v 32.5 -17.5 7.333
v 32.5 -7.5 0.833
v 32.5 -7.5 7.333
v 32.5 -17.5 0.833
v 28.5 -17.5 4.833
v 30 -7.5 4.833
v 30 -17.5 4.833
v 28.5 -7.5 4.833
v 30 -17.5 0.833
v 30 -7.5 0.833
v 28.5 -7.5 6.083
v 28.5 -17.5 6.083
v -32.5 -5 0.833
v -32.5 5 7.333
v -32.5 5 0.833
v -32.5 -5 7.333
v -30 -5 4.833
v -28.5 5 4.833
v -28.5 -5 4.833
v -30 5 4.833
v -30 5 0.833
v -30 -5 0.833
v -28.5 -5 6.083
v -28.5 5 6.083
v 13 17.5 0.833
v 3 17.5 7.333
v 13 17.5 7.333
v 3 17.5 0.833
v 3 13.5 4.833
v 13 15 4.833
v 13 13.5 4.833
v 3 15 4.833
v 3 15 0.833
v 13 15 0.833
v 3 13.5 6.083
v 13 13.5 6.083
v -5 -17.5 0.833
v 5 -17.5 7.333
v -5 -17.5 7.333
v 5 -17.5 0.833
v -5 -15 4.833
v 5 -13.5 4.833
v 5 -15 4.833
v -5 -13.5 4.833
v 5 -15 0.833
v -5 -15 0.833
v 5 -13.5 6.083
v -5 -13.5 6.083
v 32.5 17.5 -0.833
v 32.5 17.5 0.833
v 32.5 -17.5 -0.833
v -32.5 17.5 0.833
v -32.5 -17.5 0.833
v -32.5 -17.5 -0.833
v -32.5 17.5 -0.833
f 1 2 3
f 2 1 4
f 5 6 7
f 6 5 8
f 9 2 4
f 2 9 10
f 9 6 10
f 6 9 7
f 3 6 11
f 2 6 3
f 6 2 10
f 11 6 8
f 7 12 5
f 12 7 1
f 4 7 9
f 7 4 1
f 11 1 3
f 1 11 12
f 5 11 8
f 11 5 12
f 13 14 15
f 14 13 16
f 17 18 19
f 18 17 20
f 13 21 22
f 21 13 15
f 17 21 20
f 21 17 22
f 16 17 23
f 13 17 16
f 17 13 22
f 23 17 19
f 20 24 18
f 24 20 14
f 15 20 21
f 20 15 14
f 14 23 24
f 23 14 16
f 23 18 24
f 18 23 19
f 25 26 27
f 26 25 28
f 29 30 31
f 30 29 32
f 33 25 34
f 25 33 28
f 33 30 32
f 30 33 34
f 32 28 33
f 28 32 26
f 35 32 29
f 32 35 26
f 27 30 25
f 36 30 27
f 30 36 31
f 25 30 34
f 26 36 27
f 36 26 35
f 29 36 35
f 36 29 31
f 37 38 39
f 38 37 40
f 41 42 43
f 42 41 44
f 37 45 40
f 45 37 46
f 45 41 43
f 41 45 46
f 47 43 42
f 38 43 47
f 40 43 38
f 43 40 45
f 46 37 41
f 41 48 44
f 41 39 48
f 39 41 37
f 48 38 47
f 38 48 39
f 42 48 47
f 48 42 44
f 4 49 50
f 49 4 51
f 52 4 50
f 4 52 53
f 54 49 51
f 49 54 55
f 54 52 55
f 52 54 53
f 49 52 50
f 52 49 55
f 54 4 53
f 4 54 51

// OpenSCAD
$fn = 100;

// element dimensions
w = 60;
d = 30;
h = 4;

// aditionnal parameters
e = 5;

// internal values
we = w + e;
de = d + e;

translate([0,0,e/2]);
cube([we,de,e/3], true);
module tab() {
    translate([-e/4,0,(e/3+h)/2]) {
        cube([e/2,2*e,h], true);
        translate([-1.75*e,-e,h/2])
        rotate([0,-90,-90])
        linear_extrude(height = 2*e)
        polygon([[0,1.2*e],[e/4,1.2*e],[0,2*e],[e/2,2*e]],
                [[0,1,3,2]]);
    }
}

translate([we/2,-de/2+e,0])
tab();

translate([-we/2,0,0])
rotate([0,0,180])
tab();

translate([8,de/2,0])
rotate([0,0,90])
tab();

translate([0,-de/2,0])
rotate([0,0,-90])
tab();
